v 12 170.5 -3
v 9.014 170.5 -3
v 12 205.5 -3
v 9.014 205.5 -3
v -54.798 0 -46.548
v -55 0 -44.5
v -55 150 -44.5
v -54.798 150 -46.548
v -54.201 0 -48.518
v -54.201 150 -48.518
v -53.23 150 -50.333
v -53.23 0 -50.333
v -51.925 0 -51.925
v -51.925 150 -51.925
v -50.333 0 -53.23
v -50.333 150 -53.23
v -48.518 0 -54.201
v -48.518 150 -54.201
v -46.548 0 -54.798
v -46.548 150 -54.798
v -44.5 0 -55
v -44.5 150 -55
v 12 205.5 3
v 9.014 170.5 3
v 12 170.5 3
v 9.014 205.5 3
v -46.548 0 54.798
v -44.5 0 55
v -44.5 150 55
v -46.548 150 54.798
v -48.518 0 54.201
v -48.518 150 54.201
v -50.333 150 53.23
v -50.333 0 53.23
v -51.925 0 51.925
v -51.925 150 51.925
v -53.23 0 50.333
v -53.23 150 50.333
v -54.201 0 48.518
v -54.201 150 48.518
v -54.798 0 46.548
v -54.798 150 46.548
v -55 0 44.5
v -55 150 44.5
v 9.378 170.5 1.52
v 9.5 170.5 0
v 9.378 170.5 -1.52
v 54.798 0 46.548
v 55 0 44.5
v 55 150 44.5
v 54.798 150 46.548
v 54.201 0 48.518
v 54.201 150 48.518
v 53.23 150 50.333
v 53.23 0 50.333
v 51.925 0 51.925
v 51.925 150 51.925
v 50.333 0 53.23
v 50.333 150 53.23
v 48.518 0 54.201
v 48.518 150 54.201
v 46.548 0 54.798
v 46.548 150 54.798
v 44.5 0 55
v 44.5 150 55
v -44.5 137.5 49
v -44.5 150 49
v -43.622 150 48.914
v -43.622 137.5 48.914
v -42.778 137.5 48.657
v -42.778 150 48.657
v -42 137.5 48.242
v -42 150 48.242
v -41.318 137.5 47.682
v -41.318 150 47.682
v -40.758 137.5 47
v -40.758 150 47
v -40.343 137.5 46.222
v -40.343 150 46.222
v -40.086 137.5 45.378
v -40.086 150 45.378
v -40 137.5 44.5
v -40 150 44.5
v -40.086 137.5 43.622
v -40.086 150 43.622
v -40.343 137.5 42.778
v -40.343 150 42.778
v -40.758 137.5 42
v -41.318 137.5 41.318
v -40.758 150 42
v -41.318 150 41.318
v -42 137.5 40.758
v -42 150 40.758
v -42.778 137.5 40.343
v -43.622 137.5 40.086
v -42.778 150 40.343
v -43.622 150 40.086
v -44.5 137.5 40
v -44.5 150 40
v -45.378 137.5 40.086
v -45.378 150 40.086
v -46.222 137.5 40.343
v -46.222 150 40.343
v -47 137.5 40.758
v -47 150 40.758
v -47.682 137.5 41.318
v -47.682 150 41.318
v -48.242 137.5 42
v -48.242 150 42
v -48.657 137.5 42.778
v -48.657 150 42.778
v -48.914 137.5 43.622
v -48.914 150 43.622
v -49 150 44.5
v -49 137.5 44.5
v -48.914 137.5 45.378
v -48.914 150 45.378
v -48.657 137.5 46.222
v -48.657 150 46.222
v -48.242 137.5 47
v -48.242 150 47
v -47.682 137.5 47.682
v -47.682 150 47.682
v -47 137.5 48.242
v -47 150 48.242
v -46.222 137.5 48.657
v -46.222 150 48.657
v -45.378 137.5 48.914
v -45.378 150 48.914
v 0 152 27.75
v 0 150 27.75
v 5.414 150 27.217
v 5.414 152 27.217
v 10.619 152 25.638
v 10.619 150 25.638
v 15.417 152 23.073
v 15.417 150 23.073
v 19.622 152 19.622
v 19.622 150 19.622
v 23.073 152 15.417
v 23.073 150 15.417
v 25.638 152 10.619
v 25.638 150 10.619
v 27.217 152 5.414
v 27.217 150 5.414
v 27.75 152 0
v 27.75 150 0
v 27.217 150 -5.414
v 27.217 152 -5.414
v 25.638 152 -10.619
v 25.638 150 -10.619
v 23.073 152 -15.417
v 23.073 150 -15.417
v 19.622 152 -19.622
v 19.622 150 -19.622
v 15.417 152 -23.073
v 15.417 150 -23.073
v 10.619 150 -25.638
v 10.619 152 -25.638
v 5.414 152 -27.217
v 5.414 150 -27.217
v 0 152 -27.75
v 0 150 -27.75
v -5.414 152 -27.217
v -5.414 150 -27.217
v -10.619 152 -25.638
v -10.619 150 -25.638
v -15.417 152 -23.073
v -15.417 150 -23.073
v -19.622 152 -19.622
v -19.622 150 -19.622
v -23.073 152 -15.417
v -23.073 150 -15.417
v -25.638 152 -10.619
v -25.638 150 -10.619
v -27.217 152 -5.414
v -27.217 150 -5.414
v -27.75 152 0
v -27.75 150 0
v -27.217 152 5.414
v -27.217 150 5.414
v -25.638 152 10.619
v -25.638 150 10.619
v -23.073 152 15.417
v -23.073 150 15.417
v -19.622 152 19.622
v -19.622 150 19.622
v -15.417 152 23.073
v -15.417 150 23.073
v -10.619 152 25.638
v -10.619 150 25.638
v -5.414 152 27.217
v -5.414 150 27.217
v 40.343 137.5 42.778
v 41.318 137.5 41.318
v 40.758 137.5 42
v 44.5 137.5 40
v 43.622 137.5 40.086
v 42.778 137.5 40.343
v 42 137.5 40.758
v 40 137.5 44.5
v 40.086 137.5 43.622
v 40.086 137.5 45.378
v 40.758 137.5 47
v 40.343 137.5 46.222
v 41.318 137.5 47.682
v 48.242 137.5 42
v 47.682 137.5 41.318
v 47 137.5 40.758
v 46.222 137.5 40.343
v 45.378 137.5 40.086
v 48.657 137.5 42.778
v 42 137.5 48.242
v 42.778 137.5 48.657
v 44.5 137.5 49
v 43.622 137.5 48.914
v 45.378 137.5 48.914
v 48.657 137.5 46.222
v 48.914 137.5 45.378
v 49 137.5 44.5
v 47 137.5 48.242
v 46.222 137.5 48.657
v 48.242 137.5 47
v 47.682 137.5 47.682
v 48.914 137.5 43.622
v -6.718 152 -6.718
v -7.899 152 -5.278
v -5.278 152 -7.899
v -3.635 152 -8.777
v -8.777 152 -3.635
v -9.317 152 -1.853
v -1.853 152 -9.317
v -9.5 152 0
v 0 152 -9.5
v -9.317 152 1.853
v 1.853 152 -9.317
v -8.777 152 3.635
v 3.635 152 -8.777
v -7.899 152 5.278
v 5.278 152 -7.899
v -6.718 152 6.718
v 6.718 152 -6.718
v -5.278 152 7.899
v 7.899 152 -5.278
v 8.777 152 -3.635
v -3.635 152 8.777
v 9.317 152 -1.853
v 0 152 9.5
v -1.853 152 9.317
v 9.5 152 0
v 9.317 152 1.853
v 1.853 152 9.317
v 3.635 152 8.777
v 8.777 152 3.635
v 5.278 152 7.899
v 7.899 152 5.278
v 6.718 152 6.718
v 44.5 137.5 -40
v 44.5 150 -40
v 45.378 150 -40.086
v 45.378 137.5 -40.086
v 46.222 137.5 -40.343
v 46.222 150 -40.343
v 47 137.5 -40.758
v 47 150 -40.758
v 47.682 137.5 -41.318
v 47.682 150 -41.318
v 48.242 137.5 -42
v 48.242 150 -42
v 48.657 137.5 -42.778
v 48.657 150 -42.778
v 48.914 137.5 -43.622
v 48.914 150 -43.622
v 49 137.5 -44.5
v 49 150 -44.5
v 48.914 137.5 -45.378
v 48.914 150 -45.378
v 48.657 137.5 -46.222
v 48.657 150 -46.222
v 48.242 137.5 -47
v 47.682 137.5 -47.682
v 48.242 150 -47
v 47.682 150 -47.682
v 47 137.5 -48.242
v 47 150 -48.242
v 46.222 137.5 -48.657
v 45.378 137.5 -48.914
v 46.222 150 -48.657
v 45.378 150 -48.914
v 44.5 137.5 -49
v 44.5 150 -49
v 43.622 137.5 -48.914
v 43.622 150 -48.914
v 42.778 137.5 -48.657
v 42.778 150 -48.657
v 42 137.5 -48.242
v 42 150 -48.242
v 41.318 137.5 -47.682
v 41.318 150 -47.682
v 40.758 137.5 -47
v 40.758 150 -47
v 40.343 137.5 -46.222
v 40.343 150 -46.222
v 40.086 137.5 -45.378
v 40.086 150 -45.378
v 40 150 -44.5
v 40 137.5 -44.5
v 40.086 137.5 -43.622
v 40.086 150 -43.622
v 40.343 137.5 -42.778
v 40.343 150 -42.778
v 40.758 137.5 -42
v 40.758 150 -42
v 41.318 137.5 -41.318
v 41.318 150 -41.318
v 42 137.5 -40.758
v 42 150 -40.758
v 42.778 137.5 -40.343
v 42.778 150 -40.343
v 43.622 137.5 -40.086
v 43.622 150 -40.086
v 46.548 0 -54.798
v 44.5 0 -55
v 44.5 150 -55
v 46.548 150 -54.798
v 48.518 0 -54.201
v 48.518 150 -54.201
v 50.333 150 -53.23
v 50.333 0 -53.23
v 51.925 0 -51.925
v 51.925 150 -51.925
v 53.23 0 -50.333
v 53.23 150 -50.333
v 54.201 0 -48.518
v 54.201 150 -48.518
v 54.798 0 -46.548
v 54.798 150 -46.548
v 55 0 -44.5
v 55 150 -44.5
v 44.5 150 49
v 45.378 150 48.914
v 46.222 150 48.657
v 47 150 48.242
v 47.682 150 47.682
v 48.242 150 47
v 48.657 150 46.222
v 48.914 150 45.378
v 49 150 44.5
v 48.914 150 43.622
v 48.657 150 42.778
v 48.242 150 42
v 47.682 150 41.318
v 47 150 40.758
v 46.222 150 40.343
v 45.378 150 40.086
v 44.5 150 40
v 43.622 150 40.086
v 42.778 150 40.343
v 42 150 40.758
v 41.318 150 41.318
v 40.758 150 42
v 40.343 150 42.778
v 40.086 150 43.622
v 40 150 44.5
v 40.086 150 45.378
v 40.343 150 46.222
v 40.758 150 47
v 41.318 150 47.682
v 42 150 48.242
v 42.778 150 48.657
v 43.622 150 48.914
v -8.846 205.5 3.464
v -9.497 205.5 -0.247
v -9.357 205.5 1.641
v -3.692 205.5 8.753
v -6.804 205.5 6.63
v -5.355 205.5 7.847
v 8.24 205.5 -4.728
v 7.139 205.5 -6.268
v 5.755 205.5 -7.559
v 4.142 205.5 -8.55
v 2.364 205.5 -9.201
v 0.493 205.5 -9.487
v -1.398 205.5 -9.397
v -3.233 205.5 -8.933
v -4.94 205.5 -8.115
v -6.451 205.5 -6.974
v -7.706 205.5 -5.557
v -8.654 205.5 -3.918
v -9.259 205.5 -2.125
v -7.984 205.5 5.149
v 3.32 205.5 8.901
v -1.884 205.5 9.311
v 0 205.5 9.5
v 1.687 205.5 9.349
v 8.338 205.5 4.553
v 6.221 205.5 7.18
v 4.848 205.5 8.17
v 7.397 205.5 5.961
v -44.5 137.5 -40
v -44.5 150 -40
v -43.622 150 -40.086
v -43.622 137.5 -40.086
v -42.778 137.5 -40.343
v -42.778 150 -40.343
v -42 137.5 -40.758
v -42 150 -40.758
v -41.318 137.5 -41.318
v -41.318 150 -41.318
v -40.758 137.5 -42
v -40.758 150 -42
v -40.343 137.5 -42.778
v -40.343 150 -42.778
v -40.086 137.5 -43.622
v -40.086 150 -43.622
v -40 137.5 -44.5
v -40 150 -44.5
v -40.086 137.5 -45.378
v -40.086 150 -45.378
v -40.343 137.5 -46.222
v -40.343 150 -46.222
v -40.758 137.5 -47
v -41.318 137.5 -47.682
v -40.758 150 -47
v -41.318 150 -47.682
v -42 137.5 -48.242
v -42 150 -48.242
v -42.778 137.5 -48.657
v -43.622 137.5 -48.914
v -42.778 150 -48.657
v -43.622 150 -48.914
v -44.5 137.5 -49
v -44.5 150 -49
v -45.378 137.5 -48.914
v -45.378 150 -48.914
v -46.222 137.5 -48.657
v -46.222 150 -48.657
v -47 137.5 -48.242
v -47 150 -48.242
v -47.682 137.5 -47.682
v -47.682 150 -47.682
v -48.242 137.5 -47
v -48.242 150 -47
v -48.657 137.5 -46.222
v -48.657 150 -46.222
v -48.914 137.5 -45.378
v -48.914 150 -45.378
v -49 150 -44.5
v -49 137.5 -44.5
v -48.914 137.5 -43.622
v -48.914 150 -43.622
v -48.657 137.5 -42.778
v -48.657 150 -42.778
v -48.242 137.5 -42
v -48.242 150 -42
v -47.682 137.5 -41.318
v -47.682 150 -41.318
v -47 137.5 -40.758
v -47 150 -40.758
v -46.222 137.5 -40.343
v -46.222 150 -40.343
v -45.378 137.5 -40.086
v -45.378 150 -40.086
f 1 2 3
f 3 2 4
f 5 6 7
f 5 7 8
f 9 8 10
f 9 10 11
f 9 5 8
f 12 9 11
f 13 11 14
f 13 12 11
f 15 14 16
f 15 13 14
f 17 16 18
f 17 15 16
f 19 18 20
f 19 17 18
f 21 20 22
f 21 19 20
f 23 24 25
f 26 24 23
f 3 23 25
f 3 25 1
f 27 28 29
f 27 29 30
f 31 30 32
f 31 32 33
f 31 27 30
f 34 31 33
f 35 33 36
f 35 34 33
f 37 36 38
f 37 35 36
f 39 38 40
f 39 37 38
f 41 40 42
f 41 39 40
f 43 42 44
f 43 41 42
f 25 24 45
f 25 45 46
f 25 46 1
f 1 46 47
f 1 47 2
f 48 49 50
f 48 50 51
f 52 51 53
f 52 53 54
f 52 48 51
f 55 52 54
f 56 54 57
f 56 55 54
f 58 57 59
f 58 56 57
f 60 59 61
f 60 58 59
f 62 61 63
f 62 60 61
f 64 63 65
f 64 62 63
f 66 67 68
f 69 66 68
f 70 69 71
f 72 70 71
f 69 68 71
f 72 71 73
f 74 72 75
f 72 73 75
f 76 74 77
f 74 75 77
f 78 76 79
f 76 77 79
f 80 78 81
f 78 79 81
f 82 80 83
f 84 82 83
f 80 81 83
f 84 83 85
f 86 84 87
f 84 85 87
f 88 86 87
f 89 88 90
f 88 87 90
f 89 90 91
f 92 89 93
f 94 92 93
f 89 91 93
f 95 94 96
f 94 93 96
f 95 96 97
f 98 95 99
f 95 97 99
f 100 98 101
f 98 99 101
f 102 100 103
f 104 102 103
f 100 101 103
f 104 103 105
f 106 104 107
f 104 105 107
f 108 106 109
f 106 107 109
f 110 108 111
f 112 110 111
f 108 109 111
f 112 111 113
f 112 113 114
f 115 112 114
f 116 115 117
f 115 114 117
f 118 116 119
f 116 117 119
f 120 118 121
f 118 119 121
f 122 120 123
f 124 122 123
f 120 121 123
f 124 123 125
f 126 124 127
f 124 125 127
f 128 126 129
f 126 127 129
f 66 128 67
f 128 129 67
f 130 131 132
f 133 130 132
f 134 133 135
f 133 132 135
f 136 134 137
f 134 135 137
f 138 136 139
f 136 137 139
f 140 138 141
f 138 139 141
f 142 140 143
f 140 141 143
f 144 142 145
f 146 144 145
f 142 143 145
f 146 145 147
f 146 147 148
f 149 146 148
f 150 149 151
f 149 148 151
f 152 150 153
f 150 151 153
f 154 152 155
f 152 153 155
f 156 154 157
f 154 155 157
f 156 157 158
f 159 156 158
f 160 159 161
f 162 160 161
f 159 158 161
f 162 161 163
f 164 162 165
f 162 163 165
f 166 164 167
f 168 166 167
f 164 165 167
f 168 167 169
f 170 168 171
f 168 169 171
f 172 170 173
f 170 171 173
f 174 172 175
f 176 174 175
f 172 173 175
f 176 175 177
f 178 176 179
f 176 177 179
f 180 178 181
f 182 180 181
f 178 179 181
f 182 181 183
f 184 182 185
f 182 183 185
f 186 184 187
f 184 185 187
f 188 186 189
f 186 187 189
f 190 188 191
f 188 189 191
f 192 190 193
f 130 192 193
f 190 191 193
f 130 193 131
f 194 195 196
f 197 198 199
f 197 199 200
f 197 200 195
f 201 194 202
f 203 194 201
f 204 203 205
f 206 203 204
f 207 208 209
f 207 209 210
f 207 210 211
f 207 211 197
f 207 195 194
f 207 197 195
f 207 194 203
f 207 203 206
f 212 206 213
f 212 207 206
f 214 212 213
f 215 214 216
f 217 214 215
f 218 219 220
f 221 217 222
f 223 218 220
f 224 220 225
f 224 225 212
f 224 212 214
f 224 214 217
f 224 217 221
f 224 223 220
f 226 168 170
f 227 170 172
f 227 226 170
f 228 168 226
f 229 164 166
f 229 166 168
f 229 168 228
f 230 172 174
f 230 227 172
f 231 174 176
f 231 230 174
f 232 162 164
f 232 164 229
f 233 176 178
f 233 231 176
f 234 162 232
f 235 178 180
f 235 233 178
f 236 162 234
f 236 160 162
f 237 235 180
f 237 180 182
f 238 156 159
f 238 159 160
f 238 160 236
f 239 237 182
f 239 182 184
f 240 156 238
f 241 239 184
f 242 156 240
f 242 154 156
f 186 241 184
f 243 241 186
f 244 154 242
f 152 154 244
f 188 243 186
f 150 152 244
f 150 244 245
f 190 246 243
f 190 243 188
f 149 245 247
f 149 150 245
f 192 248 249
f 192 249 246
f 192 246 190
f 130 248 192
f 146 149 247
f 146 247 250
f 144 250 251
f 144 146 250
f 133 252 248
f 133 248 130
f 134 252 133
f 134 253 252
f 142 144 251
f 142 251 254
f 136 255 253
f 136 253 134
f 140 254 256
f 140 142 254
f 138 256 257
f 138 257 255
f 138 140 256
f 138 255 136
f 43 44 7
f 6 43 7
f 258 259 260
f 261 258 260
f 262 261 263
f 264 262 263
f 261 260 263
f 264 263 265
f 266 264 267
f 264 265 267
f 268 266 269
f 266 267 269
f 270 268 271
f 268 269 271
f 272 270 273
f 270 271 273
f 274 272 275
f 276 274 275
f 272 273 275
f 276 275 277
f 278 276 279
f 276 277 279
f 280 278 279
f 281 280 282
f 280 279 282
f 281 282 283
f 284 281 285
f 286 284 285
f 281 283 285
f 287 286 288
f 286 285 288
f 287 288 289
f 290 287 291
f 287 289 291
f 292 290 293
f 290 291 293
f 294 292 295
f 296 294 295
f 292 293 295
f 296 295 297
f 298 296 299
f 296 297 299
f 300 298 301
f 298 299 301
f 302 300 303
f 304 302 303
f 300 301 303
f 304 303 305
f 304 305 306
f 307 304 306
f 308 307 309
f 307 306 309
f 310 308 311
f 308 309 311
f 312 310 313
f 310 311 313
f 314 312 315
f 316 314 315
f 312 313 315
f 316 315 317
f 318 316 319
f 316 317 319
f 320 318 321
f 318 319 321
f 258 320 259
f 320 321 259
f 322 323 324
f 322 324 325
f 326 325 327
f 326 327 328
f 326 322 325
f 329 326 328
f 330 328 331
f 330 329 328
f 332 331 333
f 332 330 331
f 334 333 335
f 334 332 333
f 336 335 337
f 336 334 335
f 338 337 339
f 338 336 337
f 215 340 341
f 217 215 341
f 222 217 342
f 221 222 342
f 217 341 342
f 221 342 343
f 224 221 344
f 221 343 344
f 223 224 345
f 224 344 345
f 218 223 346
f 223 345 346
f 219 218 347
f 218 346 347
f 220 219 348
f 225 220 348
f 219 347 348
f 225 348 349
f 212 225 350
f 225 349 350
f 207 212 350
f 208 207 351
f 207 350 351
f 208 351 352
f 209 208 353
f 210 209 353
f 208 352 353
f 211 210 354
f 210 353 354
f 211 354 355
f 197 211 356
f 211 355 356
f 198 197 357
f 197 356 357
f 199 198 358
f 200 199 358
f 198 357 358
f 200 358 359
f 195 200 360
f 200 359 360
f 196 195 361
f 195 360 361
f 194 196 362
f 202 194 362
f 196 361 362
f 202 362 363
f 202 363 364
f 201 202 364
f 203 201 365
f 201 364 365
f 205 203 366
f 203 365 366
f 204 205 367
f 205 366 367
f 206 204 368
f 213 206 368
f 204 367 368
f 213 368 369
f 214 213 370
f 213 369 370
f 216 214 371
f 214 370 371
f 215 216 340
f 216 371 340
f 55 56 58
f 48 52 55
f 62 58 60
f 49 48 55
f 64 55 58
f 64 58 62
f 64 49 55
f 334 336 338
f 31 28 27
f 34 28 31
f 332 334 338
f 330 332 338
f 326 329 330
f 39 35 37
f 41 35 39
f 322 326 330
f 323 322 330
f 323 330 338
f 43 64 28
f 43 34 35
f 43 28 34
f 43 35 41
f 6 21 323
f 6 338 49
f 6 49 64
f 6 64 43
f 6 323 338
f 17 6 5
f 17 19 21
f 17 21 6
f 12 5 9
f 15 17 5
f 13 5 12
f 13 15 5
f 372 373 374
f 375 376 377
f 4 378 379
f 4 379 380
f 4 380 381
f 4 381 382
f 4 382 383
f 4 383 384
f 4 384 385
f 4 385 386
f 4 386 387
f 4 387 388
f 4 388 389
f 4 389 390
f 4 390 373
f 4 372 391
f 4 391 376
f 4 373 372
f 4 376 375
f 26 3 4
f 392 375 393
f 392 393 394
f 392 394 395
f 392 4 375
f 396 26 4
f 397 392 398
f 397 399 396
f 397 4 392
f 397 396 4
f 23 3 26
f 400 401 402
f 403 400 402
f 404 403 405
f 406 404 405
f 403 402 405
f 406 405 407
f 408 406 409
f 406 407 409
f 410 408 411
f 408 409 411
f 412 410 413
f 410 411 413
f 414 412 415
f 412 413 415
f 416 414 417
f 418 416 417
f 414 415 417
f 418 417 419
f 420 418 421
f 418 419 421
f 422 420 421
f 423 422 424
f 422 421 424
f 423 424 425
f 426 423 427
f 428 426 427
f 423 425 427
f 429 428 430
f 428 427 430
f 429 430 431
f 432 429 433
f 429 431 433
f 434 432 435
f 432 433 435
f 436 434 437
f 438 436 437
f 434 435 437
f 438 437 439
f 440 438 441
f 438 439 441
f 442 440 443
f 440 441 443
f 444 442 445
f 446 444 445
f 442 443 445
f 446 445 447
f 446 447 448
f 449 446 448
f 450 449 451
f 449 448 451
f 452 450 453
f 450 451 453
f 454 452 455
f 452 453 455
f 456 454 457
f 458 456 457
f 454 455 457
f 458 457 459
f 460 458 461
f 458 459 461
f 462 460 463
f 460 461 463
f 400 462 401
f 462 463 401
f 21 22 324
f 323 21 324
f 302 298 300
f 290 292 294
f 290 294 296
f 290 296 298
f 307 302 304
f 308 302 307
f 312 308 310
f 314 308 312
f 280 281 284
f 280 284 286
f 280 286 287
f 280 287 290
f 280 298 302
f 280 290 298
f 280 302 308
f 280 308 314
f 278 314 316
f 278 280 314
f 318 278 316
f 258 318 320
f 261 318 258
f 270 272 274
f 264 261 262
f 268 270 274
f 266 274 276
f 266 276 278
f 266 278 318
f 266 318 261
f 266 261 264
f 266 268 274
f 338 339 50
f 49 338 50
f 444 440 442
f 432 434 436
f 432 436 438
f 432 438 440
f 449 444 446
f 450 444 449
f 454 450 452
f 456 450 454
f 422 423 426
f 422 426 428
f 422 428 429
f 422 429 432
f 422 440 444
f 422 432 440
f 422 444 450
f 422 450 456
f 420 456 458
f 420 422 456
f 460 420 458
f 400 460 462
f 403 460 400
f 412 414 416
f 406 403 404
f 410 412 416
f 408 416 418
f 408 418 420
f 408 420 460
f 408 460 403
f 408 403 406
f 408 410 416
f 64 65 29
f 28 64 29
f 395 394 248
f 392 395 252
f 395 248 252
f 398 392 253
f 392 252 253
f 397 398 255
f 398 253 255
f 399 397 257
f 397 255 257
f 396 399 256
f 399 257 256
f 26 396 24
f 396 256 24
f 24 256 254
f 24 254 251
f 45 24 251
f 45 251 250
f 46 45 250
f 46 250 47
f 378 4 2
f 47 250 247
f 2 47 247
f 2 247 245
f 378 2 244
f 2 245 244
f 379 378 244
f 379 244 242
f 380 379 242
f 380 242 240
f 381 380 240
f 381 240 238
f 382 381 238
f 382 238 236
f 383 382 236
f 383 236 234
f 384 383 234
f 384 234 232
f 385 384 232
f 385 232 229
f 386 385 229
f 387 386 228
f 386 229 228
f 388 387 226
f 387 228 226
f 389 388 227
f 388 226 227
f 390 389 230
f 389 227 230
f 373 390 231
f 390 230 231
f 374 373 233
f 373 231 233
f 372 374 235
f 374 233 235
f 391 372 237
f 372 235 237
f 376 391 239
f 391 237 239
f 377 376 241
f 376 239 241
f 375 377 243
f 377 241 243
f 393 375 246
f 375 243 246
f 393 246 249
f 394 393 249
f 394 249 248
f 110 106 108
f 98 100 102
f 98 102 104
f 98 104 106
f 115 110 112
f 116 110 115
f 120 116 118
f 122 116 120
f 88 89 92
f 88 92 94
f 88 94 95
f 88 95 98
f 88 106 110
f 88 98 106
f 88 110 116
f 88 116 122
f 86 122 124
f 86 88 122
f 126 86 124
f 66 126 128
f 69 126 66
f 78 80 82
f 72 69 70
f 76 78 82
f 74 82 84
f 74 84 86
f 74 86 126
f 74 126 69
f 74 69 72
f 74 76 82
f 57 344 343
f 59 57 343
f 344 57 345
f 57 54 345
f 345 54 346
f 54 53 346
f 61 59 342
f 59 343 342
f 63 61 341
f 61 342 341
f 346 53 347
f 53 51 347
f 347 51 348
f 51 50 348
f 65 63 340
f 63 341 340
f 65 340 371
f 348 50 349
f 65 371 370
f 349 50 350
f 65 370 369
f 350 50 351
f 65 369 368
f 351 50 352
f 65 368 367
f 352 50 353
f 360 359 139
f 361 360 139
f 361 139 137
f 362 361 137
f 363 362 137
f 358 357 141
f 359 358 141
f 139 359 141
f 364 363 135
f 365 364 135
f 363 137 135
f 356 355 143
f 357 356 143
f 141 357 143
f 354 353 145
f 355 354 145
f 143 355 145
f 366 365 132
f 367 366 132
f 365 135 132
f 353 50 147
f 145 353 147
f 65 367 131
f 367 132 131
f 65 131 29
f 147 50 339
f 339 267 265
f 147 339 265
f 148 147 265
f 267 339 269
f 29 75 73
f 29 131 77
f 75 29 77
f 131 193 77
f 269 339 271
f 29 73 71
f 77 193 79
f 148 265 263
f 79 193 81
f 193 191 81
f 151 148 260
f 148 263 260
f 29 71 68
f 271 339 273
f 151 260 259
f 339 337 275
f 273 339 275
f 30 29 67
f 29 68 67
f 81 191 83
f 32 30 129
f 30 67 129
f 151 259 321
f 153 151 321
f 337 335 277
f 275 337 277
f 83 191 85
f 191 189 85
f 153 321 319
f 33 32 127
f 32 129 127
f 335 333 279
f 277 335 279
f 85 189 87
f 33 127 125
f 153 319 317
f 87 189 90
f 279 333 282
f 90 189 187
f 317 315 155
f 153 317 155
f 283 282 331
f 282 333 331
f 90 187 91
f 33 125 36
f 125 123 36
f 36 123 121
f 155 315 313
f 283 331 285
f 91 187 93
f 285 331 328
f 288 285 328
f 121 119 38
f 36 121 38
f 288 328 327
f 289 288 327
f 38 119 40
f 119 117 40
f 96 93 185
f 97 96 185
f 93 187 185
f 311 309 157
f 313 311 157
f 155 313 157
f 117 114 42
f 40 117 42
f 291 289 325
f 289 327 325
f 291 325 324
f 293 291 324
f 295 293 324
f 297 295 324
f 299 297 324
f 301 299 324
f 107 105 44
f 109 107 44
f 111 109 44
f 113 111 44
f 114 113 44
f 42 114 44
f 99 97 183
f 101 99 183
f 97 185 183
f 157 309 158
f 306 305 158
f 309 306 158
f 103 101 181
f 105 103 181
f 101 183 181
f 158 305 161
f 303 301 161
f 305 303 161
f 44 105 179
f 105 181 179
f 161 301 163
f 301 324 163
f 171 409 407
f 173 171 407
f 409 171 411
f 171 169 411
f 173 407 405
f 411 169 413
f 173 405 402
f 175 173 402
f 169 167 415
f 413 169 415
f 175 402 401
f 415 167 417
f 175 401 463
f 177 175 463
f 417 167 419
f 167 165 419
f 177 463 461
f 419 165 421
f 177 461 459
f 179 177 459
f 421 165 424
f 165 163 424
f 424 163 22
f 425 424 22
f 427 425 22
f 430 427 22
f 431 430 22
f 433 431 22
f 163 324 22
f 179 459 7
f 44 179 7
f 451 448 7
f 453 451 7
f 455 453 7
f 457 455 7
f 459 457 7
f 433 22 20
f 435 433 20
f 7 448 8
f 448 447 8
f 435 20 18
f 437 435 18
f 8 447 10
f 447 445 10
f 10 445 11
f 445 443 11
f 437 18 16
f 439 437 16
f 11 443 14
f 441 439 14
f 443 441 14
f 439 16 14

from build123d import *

# Parameters (mm, degrees)
BOSS_EXTRUDE1_DEPTH = 150
SKETCH2_R           = 4.5
CUT_EXTRUDE2_DEPTH  = 12.5
SKETCH3_R           = 9.5
BOSS_EXTRUDE2_DEPTH = 55.5
SKETCH4_R           = 27.75
BOSS_EXTRUDE3_DEPTH = 2
SKETCH5_W           = 6
SKETCH5_H           = 35
BOSS_EXTRUDE4_DEPTH = 12


with BuildPart() as part:
    # Sketch1 → Boss-Extrude1 (new body)
    with BuildSketch(Plane(origin=(0, 0, 0), x_dir=(1, 0, 0), z_dir=(0, 1, 0))):
        with BuildLine():
            Line((-44.5, 55), (44.5, 55))
            ThreePointArc((44.5, 55), (51.924621202, 51.924621202), (55, 44.5))
            Line((55, 44.5), (55, -44.5))
            ThreePointArc((55, -44.5), (51.924621202, -51.924621202), (44.5, -55))
            Line((44.5, -55), (-44.5, -55))
            ThreePointArc((-44.5, -55), (-51.924621202, -51.924621202), (-55, -44.5))
            Line((-55, -44.5), (-55, 44.5))
            ThreePointArc((-55, 44.5), (-51.924621202, 51.924621202), (-44.5, 55))
        make_face()
    extrude(amount=BOSS_EXTRUDE1_DEPTH)

    # Sketch2 → Cut-Extrude2 (cut)
    with BuildSketch(Plane(origin=(0, 150, 0), x_dir=(1, 0, 0), z_dir=(0, 1, 0))):
        with Locations(Location((-44.5, 44.5, 0), (0, 0, 270))):
            Circle(SKETCH2_R)
        with Locations(Location((44.5, 44.5, 0), (0, 0, 270))):
            Circle(SKETCH2_R)
        with Locations(Location((-44.5, -44.5, 0), (0, 0, 270))):
            Circle(SKETCH2_R)
        with Locations(Location((44.5, -44.5, 0), (0, 0, 270))):
            Circle(SKETCH2_R)
    extrude(amount=-CUT_EXTRUDE2_DEPTH, mode=Mode.SUBTRACT)

    # Sketch3 → Boss-Extrude2 (add)
    with BuildSketch(Plane(origin=(0, 150, 0), x_dir=(1, 0, 0), z_dir=(0, 1, 0))):
        with Locations(Location((0, 0, 0), (0, 0, 270))):
            Circle(SKETCH3_R)
    extrude(amount=BOSS_EXTRUDE2_DEPTH)

    # Sketch4 → Boss-Extrude3 (add)
    with BuildSketch(Plane(origin=(0, 150, 0), x_dir=(1, 0, 0), z_dir=(0, 1, 0))):
        with Locations(Location((0, 0, 0), (0, 0, 270))):
            Circle(SKETCH4_R)
    extrude(amount=BOSS_EXTRUDE3_DEPTH)

    # Sketch5 → Boss-Extrude4 (add)
    with BuildSketch(Plane(origin=(0, 0, 0), x_dir=(0, 0, -1), z_dir=(1, 0, 0))):
        with Locations((0, 188)):
            Rectangle(SKETCH5_W, SKETCH5_H)
    extrude(amount=BOSS_EXTRUDE4_DEPTH)


solid = part.part
